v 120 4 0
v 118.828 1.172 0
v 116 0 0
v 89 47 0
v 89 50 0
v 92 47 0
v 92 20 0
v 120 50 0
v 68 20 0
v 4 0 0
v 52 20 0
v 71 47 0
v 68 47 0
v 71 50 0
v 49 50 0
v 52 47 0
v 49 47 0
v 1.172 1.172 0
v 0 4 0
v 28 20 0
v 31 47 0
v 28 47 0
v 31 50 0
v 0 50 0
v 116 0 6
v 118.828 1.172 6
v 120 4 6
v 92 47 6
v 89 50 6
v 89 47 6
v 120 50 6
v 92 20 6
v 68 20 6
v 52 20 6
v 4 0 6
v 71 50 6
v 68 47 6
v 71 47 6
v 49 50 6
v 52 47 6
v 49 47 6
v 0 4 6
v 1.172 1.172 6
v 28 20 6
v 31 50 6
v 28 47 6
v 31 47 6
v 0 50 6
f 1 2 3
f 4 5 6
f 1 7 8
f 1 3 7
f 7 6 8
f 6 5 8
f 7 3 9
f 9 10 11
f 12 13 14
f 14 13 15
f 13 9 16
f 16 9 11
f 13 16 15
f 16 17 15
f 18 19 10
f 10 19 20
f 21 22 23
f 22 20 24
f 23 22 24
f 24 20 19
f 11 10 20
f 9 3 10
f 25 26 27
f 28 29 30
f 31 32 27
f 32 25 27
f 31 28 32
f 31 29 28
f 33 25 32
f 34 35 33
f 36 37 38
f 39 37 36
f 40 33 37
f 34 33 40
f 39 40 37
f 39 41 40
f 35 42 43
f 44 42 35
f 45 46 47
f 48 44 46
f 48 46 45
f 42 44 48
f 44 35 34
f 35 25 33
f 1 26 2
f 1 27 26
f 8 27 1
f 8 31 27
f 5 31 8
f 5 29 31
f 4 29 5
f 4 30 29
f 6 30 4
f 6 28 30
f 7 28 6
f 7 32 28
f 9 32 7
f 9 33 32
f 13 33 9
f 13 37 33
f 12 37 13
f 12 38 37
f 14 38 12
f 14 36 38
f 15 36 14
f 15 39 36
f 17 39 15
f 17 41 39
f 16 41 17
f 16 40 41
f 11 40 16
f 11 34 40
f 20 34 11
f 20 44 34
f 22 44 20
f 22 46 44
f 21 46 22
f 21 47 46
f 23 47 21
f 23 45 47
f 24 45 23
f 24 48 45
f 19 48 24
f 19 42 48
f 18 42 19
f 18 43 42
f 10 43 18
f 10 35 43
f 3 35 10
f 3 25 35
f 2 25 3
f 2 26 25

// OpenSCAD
$fn = 32;

// ----------------------------------------------------------------------
// Oversize slot bar: 120 mm bar with 2 oversize windows
// ----------------------------------------------------------------------

// --- parameters (mm) ---
profile_height = 6;       // extrusion height
profile_points = 24;      // points of the closed outline

profile = [[0, 4], [1.172, 1.172], [4, 0], [116, 0], [118.828, 1.172], [120, 4], [120, 50], [89, 50], [89, 47], [92, 47], [92, 20], [68, 20], [68, 47], [71, 47], [71, 50], [49, 50], [49, 47], [52, 47], [52, 20], [28, 20], [28, 47], [31, 47], [31, 50], [0, 50]];  // single closed polygon, 24 points, counter clockwise

// --- the one profile operation ---
linear_extrude(height = profile_height) polygon(points = profile);
